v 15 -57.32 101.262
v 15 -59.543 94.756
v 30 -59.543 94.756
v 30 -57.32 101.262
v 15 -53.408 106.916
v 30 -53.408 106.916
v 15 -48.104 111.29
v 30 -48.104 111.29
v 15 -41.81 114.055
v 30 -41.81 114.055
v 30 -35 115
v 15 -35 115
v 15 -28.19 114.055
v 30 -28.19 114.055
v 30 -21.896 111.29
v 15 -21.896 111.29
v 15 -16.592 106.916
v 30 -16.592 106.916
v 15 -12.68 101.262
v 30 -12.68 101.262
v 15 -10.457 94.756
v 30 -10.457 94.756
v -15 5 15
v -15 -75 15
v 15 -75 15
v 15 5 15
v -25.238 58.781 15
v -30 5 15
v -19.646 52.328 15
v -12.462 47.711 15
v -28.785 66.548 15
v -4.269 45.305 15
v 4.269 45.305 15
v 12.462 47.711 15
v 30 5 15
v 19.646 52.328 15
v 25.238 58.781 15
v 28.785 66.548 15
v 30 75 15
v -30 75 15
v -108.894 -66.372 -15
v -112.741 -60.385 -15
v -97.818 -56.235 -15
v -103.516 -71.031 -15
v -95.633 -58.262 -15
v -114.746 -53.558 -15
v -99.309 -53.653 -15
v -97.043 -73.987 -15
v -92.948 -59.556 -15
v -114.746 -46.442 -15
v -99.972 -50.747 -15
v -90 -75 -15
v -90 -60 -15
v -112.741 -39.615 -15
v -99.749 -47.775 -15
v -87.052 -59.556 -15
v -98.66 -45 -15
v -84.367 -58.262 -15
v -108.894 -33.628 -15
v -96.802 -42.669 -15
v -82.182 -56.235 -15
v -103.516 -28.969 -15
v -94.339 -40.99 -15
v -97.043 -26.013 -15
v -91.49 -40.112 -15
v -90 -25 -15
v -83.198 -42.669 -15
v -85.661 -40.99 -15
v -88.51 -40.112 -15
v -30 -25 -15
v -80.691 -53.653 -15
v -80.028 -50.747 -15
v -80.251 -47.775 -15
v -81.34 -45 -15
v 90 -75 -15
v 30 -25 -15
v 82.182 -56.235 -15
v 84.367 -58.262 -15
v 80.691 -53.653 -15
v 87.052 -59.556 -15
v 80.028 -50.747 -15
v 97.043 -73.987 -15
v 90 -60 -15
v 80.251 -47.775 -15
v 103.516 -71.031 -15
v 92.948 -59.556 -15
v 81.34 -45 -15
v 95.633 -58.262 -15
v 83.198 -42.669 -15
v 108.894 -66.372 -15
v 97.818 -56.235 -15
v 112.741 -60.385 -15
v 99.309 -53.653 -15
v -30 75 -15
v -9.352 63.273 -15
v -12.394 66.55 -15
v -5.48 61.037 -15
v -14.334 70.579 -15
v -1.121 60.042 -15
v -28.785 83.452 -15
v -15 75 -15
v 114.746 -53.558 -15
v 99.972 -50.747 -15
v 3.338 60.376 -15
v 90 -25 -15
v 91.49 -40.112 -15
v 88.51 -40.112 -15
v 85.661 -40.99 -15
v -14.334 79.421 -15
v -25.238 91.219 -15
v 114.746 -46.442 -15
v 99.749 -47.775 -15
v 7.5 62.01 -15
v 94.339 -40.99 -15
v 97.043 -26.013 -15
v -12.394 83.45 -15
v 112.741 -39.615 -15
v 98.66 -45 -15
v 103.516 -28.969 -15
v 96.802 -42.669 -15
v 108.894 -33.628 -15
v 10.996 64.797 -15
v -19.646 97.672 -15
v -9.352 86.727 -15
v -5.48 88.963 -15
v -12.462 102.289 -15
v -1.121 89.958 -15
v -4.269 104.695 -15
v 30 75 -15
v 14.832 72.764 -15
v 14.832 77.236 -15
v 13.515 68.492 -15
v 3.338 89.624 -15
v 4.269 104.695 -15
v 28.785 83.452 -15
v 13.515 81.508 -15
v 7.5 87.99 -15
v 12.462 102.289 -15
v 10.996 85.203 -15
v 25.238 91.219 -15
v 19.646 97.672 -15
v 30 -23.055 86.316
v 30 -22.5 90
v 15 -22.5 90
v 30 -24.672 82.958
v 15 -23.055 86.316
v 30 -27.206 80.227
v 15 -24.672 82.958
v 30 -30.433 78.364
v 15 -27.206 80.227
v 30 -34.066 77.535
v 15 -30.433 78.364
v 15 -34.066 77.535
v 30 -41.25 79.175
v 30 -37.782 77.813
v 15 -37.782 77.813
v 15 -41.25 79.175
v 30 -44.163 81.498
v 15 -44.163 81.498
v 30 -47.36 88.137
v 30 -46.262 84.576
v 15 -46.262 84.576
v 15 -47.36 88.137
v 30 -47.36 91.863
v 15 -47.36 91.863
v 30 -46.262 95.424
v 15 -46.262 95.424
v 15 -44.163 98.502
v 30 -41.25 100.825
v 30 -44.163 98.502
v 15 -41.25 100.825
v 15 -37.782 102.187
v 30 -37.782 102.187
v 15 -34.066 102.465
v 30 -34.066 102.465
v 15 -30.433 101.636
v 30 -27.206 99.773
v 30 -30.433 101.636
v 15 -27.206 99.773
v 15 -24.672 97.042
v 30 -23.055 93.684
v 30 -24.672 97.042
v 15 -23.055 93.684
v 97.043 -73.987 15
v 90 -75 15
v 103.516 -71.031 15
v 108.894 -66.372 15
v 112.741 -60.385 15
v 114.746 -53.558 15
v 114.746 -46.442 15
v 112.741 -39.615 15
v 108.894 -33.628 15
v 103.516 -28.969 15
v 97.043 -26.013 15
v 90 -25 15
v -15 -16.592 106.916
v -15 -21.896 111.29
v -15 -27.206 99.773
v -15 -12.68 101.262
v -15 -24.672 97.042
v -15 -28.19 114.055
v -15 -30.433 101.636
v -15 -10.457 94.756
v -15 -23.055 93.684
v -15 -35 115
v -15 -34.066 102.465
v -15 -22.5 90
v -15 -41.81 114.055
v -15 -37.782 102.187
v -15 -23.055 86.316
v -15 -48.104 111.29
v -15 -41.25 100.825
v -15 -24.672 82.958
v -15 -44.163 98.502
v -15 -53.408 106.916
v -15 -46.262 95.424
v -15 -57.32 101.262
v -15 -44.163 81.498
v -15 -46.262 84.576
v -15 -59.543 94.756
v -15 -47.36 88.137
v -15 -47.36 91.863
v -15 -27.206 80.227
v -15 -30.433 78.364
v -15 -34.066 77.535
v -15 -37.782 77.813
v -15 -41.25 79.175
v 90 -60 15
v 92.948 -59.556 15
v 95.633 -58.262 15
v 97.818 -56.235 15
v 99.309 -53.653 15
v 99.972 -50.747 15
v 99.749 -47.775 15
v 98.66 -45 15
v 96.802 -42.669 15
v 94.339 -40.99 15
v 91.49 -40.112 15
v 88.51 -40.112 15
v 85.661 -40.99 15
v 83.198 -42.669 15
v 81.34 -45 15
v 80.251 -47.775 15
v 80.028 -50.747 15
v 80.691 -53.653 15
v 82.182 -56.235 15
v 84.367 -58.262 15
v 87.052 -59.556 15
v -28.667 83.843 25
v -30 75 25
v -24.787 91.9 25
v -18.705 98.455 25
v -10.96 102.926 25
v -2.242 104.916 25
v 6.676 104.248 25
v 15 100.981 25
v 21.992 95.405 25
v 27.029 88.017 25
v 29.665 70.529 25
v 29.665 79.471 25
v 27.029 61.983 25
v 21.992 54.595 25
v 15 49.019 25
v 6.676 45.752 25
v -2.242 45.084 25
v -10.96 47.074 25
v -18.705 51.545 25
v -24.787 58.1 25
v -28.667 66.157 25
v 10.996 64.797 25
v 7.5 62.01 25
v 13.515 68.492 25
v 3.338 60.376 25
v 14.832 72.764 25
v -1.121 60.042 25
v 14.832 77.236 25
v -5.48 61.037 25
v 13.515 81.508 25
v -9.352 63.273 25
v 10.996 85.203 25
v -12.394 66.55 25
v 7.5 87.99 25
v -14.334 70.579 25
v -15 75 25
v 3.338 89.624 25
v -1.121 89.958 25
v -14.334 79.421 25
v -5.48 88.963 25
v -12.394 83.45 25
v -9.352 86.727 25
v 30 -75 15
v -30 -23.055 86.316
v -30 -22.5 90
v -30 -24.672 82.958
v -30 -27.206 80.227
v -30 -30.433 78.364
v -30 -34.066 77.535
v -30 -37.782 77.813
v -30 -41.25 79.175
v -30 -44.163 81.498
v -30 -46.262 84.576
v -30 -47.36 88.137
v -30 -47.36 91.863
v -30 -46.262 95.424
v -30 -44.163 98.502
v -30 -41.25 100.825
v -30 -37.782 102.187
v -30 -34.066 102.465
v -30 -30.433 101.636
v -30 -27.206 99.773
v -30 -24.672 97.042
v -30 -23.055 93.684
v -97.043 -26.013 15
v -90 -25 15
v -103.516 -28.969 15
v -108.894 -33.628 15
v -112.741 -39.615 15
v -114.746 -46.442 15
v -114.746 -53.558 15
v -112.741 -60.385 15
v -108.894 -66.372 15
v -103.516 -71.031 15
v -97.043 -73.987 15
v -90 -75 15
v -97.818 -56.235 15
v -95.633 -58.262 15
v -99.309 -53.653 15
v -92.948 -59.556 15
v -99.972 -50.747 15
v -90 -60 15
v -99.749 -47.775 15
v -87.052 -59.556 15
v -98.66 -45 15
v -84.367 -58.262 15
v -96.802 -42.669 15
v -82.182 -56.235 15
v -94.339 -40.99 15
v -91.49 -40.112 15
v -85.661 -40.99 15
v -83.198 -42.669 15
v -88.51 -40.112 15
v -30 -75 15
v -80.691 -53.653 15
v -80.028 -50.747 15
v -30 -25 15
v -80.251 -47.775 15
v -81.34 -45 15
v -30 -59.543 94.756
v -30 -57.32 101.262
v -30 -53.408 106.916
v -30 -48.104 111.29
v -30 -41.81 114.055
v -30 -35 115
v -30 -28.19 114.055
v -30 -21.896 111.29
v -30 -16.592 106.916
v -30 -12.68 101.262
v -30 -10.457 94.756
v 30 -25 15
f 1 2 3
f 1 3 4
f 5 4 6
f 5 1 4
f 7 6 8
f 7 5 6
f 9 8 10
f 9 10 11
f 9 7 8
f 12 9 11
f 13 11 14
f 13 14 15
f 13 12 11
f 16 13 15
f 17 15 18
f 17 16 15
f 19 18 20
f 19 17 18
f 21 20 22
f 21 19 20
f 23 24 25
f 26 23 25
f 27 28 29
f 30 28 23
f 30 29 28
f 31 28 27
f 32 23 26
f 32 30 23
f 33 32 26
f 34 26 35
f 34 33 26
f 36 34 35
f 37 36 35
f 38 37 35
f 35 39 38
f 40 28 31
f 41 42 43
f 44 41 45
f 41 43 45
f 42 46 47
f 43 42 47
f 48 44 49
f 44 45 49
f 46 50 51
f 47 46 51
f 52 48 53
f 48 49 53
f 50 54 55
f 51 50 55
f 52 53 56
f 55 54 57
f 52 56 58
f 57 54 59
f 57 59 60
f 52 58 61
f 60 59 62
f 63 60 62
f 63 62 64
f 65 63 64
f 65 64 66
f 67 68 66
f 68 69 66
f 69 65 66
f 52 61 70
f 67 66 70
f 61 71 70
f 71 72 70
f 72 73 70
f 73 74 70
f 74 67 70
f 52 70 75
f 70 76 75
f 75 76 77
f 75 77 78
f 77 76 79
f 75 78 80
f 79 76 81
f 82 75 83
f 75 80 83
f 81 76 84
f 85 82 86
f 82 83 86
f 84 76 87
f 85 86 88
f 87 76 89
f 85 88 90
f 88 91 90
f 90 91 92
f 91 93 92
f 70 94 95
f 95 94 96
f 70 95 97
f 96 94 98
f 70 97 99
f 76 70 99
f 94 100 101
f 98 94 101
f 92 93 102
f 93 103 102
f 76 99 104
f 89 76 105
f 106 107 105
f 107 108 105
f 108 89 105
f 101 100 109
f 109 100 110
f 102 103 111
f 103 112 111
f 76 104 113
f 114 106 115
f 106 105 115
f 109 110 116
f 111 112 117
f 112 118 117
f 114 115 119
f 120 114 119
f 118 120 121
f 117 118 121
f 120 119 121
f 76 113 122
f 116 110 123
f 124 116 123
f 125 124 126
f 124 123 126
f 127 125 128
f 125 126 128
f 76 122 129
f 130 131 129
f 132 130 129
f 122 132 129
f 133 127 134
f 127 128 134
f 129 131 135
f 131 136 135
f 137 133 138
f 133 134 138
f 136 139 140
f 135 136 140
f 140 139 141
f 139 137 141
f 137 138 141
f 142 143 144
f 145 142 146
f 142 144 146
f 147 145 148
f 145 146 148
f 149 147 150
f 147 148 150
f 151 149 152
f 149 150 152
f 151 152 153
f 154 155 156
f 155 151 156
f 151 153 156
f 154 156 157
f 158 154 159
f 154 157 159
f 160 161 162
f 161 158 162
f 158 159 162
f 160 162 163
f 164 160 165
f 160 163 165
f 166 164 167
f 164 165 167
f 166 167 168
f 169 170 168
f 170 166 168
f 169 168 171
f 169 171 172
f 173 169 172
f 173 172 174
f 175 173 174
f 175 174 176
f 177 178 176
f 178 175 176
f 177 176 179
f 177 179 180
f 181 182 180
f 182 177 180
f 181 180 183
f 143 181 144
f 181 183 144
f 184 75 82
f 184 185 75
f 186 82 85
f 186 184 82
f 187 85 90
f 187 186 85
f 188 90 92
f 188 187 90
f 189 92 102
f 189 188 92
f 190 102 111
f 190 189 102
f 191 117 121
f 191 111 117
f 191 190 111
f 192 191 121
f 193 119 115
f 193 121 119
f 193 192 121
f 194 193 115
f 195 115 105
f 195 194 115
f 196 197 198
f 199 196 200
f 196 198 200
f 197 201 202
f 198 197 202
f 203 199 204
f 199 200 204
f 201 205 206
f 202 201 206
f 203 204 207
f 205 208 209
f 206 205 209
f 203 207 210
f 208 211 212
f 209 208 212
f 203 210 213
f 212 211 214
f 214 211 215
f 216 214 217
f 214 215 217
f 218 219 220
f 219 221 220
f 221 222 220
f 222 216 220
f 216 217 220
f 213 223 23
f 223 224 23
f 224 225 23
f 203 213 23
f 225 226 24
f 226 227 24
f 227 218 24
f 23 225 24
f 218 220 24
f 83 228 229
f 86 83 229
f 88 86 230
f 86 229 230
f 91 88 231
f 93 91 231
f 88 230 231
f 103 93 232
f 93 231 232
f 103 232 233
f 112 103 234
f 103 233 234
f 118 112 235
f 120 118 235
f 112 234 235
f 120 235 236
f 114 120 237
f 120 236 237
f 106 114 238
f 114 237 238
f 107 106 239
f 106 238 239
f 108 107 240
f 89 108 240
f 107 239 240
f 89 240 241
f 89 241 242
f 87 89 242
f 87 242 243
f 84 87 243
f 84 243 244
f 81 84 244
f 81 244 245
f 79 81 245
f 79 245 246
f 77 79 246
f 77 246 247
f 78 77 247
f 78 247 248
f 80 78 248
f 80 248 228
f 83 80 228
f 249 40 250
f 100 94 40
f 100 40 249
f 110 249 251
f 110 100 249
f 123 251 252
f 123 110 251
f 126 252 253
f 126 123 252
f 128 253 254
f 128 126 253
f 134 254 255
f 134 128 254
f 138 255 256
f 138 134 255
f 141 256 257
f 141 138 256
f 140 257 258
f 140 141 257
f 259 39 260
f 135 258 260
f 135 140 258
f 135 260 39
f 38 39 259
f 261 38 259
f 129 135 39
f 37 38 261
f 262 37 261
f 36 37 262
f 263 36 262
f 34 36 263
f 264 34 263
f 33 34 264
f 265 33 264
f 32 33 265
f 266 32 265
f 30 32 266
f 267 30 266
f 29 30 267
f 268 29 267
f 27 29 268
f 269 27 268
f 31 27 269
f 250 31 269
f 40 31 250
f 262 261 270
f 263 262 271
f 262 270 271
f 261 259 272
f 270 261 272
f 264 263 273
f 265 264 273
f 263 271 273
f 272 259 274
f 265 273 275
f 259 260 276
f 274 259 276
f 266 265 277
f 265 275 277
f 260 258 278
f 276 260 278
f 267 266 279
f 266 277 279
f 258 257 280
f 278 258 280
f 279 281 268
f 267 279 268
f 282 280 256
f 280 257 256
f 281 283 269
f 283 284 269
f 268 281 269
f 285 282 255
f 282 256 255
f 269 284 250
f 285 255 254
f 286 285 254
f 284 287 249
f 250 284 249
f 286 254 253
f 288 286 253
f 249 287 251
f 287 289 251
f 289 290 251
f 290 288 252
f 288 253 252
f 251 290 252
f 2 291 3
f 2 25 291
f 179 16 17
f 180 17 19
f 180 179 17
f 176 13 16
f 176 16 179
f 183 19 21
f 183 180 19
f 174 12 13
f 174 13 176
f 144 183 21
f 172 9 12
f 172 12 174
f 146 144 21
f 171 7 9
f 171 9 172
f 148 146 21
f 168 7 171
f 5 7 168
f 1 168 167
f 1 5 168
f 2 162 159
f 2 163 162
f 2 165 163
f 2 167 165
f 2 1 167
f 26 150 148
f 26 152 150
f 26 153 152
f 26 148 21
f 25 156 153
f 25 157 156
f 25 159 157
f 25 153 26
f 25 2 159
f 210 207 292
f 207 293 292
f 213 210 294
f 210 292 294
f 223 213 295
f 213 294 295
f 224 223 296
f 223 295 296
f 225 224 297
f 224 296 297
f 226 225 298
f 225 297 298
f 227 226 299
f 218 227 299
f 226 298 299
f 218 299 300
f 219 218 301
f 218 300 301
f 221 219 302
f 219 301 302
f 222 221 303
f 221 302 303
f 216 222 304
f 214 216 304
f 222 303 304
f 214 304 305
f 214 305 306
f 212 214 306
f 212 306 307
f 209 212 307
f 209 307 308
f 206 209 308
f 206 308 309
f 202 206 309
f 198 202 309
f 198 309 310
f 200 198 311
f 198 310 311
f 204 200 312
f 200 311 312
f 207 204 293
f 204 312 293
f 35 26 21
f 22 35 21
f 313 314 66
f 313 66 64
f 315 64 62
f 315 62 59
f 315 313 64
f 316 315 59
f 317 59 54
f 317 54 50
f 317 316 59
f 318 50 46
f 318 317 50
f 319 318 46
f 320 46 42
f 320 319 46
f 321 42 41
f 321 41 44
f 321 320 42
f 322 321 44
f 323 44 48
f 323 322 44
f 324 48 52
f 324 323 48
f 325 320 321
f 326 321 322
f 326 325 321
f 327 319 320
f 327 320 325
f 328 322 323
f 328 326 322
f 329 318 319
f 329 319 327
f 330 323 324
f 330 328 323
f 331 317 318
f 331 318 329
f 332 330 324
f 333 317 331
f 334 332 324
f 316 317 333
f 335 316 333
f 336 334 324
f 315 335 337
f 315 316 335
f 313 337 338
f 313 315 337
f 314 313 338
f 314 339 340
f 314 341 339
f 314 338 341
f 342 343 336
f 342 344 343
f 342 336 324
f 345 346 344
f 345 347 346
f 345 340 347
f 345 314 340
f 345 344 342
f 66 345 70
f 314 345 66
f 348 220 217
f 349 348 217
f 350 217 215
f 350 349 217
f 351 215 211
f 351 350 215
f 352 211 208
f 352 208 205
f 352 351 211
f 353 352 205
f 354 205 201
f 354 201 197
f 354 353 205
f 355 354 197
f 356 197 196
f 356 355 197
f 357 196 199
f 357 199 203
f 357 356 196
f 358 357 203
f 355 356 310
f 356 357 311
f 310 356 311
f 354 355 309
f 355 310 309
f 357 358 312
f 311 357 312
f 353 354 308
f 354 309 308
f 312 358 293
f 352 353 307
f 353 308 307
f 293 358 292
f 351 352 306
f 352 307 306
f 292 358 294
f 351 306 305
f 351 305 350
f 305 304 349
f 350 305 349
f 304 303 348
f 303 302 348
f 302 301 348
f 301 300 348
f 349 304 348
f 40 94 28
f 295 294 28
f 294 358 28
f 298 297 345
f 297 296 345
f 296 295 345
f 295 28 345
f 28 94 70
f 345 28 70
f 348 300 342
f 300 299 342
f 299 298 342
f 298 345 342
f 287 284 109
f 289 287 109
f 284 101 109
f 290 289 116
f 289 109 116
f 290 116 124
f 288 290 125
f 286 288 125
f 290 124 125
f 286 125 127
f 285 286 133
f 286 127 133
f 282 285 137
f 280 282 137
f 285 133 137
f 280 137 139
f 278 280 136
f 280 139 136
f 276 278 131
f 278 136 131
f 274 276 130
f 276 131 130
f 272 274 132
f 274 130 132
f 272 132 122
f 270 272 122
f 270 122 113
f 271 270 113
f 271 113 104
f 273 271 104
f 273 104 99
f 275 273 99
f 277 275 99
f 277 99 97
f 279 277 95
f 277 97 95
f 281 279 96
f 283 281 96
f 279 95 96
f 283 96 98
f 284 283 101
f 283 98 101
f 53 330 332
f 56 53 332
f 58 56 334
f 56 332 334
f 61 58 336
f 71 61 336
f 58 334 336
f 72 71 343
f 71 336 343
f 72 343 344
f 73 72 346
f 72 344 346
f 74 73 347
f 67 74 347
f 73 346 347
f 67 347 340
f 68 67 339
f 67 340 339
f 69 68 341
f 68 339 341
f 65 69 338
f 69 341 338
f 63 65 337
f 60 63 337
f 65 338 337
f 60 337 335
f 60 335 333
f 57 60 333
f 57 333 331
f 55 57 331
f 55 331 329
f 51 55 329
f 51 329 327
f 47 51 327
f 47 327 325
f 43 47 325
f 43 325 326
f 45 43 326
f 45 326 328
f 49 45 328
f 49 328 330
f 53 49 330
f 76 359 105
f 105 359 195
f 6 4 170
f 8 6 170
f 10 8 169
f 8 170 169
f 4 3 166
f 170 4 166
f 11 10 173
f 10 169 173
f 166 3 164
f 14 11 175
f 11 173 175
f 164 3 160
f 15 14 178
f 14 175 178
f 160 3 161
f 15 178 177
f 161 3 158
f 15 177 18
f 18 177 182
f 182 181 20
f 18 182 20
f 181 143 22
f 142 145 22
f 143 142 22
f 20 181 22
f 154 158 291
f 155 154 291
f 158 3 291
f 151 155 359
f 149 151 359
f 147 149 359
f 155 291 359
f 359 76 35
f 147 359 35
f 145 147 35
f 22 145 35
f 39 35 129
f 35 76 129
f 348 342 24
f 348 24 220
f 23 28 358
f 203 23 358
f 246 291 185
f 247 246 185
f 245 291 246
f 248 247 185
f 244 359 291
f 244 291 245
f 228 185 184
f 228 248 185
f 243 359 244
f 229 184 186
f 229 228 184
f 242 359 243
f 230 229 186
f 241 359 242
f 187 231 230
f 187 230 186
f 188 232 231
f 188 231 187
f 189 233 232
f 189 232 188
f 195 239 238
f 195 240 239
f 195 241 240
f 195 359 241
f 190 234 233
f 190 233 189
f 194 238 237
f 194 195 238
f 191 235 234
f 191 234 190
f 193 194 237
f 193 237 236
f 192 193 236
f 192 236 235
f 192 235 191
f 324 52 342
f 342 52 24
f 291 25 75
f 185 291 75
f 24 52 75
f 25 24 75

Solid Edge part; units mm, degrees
sketch "Sketch1" plane through (0, 0, 0) normal (0, 0, 1) x (1, 0, 0)
  line L0 (-30, 75) -> (-30, -75)
  line L1 (-30, -75) -> (30, -75)
  line L2 (30, -75) -> (30, 75)
  line L3 (30, 75) -> (-30, 75)
extrude "Protrusion1" add sketch "Sketch1" along normal mid plane 30
sketch "Sketch2" plane through (0, 0, -15) normal (0, 0, -1) x (-1, 0, 0)
  circle A0 centre (0, 75) radius 30
extrude "ExtrudedCutout_1" cut sketch "Sketch2" against normal blind 30
sketch "Sketch3" plane through (0, 0, -15) normal (0, 0, -1) x (-1, 0, 0)
  circle A0 centre (0, 75) radius 30
  circle A1 centre (0, 75) radius 15
extrude "ExtrudedProtrusion_2" add sketch "Sketch3" against normal blind 40
sketch "Sketch4" plane through (0, 0, 15) normal (0, 0, 1) x (0, -1, 0)
  line L0 (75, 90) -> (75, 30)
  line L1 (75, 30) -> (25, 30)
  line L2 (25, 30) -> (25, 90)
  arc A0 (25, 90) -> (75, 90) centre (50, 90) cw
  circle A1 centre (50, 90) radius 10
  line L3 (75, -90) -> (75, -30)
  line L4 (75, -30) -> (25, -30)
  line L5 (25, -30) -> (25, -90)
  arc A2 (25, -90) -> (75, -90) centre (50, -90) ccw
  circle A3 centre (50, -90) radius 10
extrude "ExtrudedProtrusion_5" add sketch "Sketch4" against normal blind 30
sketch "Sketch5" plane through (0, 0, 0) normal (1, 0, 0) x (0, 1, 0)
  line L0 (-75, 15) -> (-59.5434, 94.7565)
  line L1 (5, 15) -> (-10.4566, 94.7565)
  line L2 (-75, 15) -> (5, 15)
  arc A0 (-59.5433, 94.7565) -> (-10.4567, 94.7565) centre (-35, 90) cw
  circle A1 centre (-35, 90) radius 12.5
extrude "ExtrudedProtrusion_6" add sketch "Sketch5" along normal mid plane 60
sketch "Sketch6" plane through (0, 0, 0) normal (1, 0, 0) x (0, 1, 0)
  line L0 (-75, 15) -> (-59.5434, 94.7565)
  line L1 (5, 15) -> (-10.4566, 94.7565)
  line L2 (-75, 15) -> (5, 15)
  arc A0 (-59.5433, 94.7565) -> (-10.4567, 94.7565) centre (-35, 90) cw
extrude "ExtrudedCutout_2" cut sketch "Sketch6" along normal mid plane 30
